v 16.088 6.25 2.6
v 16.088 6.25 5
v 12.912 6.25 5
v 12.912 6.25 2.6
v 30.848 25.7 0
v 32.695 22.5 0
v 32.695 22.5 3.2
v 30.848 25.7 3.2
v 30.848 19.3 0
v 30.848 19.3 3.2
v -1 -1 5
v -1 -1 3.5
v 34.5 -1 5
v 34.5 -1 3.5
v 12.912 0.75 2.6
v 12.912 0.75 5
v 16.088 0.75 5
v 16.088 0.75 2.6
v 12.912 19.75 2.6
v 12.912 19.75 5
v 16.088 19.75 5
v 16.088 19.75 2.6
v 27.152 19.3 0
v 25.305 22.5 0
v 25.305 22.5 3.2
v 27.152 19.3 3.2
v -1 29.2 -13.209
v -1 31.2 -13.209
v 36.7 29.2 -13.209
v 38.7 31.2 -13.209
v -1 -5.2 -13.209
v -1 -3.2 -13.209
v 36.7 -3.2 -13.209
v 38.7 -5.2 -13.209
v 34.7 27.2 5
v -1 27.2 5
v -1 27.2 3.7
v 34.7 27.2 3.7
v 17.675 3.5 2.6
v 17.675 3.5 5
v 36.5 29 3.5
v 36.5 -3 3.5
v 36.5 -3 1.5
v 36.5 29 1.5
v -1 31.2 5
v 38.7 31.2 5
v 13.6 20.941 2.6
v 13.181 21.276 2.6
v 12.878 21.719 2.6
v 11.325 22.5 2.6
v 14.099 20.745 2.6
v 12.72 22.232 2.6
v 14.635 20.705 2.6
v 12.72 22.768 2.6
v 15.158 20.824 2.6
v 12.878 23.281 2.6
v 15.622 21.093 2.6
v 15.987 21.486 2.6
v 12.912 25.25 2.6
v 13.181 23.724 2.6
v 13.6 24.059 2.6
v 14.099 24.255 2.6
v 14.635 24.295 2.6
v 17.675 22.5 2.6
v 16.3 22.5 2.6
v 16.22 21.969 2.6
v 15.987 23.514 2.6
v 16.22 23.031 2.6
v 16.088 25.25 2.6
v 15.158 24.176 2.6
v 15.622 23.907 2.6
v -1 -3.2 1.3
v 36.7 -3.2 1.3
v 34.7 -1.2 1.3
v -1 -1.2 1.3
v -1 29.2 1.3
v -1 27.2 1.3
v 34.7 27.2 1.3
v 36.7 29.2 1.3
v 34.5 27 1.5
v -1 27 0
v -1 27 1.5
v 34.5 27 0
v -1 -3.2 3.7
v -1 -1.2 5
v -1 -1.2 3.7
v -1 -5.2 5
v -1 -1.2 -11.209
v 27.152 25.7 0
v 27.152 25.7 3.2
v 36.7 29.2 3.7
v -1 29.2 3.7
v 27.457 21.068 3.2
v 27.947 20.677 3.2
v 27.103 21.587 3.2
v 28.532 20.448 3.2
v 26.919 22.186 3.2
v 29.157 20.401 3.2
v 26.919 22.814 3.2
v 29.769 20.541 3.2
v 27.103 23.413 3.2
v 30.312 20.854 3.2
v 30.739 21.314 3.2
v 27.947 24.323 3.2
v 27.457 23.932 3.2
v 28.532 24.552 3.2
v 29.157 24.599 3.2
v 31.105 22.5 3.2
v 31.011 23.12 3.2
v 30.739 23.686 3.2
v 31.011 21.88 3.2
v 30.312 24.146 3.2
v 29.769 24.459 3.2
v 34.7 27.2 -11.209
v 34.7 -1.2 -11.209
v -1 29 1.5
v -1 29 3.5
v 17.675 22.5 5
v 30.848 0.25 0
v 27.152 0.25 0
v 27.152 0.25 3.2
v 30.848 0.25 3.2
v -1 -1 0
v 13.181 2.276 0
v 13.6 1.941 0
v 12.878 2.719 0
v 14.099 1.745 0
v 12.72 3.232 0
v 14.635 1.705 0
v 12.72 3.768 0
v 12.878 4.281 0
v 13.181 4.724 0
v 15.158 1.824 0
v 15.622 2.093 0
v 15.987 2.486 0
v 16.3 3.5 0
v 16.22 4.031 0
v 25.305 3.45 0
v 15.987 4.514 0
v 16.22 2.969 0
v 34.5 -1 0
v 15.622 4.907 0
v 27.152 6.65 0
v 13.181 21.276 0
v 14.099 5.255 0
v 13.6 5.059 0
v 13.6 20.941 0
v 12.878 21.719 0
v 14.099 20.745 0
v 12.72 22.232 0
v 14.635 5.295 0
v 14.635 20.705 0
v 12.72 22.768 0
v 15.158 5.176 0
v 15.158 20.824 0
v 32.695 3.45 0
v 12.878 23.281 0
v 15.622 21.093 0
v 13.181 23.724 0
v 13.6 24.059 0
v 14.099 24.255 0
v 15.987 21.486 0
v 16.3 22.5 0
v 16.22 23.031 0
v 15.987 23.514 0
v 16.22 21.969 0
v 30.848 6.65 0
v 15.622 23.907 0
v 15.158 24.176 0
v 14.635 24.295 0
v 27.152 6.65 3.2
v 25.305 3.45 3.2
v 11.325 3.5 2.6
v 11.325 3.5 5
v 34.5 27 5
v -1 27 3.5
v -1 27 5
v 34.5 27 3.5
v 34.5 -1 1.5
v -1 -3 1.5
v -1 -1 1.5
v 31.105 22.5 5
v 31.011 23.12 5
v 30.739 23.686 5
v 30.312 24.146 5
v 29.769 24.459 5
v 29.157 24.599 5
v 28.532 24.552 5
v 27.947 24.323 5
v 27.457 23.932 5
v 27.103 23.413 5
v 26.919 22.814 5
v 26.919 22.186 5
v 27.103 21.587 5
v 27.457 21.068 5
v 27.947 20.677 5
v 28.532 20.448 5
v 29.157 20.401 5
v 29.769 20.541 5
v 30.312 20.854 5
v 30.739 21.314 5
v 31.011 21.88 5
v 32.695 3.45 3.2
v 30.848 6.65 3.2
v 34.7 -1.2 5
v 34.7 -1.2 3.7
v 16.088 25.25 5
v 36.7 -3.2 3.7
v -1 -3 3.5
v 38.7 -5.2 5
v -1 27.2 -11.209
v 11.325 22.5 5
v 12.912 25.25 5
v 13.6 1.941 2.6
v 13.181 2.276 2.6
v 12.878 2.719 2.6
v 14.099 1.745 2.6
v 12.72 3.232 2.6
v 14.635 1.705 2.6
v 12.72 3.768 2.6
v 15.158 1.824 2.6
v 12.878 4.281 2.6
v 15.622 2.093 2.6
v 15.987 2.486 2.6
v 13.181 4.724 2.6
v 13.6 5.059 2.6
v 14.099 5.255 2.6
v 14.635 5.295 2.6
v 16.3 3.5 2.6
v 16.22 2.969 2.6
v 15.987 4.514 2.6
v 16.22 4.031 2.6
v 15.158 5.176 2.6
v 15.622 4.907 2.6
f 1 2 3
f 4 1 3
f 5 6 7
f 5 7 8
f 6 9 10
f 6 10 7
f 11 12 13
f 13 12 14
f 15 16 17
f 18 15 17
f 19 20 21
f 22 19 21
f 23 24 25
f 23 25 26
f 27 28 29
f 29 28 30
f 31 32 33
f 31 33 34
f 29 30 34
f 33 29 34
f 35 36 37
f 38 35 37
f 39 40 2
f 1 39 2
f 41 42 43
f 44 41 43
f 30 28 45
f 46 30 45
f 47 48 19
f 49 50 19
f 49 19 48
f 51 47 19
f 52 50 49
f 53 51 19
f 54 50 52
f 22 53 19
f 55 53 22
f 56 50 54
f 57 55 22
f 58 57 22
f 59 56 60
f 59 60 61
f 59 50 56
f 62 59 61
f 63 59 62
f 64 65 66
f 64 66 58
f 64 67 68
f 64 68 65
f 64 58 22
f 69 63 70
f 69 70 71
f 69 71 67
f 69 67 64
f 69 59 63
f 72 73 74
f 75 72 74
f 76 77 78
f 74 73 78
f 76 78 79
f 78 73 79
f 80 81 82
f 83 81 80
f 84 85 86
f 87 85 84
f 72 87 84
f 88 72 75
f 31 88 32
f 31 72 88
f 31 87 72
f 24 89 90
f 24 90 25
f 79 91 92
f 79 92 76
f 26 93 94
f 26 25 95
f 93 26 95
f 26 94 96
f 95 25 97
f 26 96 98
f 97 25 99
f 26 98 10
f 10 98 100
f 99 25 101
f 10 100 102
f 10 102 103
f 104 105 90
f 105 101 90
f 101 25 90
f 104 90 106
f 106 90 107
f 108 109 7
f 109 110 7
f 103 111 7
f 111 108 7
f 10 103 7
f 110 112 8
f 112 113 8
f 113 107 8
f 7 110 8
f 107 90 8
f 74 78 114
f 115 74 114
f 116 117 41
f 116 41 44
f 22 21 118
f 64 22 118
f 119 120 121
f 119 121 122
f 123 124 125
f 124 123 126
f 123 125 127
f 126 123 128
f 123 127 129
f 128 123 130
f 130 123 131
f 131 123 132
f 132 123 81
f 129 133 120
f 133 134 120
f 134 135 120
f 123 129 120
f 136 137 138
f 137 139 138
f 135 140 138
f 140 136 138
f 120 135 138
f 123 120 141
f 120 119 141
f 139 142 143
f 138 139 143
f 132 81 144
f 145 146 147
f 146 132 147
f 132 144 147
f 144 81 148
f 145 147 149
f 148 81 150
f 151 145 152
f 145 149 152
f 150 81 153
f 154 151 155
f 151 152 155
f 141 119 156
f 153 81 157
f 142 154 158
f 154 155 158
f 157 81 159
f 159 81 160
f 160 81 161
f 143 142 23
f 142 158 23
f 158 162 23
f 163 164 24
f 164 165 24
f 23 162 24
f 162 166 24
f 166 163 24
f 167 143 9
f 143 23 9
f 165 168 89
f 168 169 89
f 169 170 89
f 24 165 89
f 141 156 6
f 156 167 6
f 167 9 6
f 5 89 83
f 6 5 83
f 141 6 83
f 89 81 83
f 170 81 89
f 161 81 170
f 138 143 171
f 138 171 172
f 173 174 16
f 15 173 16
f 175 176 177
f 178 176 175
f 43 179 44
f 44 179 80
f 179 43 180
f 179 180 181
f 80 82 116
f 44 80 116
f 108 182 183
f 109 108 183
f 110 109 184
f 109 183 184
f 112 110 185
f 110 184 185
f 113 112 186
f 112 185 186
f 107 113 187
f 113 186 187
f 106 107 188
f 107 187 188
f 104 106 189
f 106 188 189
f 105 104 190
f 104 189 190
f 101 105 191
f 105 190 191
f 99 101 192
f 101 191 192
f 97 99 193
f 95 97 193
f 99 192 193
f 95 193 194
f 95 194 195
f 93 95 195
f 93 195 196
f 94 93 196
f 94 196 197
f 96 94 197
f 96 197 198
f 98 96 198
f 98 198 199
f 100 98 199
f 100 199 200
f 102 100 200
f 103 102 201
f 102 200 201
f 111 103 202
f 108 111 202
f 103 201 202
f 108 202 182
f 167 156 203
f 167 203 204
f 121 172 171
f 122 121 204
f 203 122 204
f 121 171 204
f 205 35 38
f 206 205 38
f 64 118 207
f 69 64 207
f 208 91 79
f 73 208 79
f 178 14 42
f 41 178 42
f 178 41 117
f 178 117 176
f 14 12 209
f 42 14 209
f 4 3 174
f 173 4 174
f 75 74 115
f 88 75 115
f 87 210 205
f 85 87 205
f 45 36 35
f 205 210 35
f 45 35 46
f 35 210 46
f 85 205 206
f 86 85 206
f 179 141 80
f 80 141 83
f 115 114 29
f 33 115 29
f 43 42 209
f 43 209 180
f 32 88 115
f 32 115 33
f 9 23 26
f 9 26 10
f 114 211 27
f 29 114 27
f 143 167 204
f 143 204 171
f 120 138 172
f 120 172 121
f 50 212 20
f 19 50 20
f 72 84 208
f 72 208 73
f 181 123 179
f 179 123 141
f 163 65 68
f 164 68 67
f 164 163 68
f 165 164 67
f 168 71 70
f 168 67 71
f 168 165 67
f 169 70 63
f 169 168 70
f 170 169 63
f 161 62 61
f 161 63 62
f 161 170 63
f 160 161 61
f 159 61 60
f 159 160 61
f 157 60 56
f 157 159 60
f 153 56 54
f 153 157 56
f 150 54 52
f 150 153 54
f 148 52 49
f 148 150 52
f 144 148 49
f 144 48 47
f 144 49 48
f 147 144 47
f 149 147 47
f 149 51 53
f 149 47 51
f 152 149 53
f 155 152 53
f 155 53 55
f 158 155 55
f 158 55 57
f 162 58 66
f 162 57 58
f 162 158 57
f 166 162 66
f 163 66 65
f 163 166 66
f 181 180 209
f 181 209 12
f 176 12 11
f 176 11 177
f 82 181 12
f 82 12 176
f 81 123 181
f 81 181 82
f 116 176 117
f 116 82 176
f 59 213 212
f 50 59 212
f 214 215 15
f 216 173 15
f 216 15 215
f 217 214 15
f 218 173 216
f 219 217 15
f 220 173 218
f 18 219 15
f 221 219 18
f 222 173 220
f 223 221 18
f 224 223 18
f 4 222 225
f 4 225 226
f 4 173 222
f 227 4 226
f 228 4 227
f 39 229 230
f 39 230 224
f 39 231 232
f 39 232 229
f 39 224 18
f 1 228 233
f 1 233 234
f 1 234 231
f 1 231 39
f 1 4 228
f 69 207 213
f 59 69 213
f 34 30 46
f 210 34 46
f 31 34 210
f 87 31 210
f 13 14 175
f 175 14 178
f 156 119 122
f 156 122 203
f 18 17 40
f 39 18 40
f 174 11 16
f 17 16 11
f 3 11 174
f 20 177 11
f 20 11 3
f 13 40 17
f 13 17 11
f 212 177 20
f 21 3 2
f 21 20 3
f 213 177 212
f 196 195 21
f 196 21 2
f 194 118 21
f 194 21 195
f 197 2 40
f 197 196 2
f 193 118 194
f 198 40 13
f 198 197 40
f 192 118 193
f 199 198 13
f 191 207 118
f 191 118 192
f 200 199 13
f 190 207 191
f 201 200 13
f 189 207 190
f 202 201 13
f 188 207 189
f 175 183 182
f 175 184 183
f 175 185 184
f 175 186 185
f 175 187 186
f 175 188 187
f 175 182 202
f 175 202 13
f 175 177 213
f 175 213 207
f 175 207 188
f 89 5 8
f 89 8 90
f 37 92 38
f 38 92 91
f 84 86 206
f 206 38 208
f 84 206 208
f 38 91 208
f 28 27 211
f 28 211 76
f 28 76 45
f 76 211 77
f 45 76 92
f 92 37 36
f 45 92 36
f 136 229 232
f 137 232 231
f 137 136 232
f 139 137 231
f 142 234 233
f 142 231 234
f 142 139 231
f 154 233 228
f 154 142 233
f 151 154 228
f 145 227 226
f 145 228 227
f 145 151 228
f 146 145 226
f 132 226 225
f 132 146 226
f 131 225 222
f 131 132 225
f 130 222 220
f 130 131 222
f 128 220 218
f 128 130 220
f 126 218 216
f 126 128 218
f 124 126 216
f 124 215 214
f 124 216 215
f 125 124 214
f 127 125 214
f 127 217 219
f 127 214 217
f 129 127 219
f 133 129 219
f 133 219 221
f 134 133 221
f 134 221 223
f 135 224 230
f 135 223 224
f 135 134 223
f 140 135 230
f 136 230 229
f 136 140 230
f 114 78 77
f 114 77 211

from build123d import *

# Parameters (mm, degrees)
SKETCH1_W           = 35.5
SKETCH1_H           = 28
SKETCH1_R           = 1.8
BOSS_EXTRUDE1_DEPTH = 5
SKETCH2_R           = 2.105
BOSS_EXTRUDE2_DEPTH = 1.8
CUT_EXTRUDE1_DEPTH  = 2.4


with BuildPart() as part:
    # Sketch1 → Boss-Extrude1 (new body)
    with BuildSketch(Plane.XY):
        with Locations((16.75, 13)):
            Rectangle(SKETCH1_W, SKETCH1_H)
        with Locations((14.5, 22.5)):
            Circle(SKETCH1_R, mode=Mode.SUBTRACT)
        with Locations((14.5, 3.5)):
            Circle(SKETCH1_R, mode=Mode.SUBTRACT)
        Polygon((25.304958277, 22.5), (27.152479139, 19.3), (30.847520861, 19.3), (32.695041723, 22.5), (30.847520861, 25.7), (27.152479139, 25.7), align=None, mode=Mode.SUBTRACT)
        Polygon((25.304958277, 3.45), (27.152479139, 0.25), (30.847520861, 0.25), (32.695041723, 3.45), (30.847520861, 6.65), (27.152479139, 6.65), align=None, mode=Mode.SUBTRACT)
    extrude(amount=BOSS_EXTRUDE1_DEPTH)

    # Sketch2 → Boss-Extrude2 (add)
    # profile 1 of 2: a face of its own
    with BuildSketch(Plane.XY.offset(5)):
        Polygon((25.304958277, 22.5), (27.152479139, 19.3), (30.847520861, 19.3), (32.695041723, 22.5), (30.847520861, 25.7), (27.152479139, 25.7), align=None)
        with Locations((29, 22.5)):
            Circle(SKETCH2_R, mode=Mode.SUBTRACT)
    # profile 2 of 2: a face of its own
    with BuildSketch(Plane.XY.offset(5)):
        Polygon((25.304958277, 3.45), (27.152479139, 0.25), (30.847520861, 0.25), (32.695041723, 3.45), (30.847520861, 6.65), (27.152479139, 6.65), align=None)
    extrude(amount=-BOSS_EXTRUDE2_DEPTH)

    # Sketch3 → Cut-Extrude1 (cut)
    with BuildSketch(Plane.XY.offset(5)):
        Polygon((11.324573519, 22.5), (12.91228676, 19.75), (16.08771324, 19.75), (17.675426481, 22.5), (16.08771324, 25.25), (12.91228676, 25.25), align=None)
        Polygon((11.324573519, 3.5), (12.91228676, 0.75), (16.08771324, 0.75), (17.675426481, 3.5), (16.08771324, 6.25), (12.91228676, 6.25), align=None)
    extrude(amount=-CUT_EXTRUDE1_DEPTH, mode=Mode.SUBTRACT)

    # Sweep1: sweep along a curve in space
    with BuildLine() as sweep1_path:
        Line((-1, 27, 2.5), (34.5, 27, 2.5))
        Line((34.5, 27, 2.5), (34.5, -1, 2.5))
        Line((34.5, -1, 2.5), (-1, -1, 2.5))
    # Sketch4 → Sweep1 (sweep)
    with BuildSketch(Plane.ZY.offset(1)):
        Polygon((2.5, 27), (1.5, 27), (1.5, 29), (3.5, 29), (3.5, 27), align=None)
    sweep(path=sweep1_path.line, transition=Transition.RIGHT)


with BuildPart() as body_2:
    # Sweep3: sweep along a curve in space
    with BuildLine() as sweep3_path:
        Line((-1, -3, 2.5), (36.5, -3, 2.5))
        Line((36.5, -3, 2.5), (36.5, 29, 2.5))
        Line((36.5, 29, 2.5), (-1, 29, 2.5))
    # Sketch5 → Sweep3 (sweep)
    with BuildSketch(Plane.ZY.offset(1)):
        Polygon((5, -1.2), (5, -5.2), (-13.2092, -5.2), (-13.2092, -3.2), (-11.2092, -1.2), (1.3, -1.2), (1.3, -3.2), (3.7, -3.2), (3.7, -1.2), align=None)
    sweep(path=sweep3_path.line, transition=Transition.RIGHT)


solid = Compound([part.part, body_2.part])
